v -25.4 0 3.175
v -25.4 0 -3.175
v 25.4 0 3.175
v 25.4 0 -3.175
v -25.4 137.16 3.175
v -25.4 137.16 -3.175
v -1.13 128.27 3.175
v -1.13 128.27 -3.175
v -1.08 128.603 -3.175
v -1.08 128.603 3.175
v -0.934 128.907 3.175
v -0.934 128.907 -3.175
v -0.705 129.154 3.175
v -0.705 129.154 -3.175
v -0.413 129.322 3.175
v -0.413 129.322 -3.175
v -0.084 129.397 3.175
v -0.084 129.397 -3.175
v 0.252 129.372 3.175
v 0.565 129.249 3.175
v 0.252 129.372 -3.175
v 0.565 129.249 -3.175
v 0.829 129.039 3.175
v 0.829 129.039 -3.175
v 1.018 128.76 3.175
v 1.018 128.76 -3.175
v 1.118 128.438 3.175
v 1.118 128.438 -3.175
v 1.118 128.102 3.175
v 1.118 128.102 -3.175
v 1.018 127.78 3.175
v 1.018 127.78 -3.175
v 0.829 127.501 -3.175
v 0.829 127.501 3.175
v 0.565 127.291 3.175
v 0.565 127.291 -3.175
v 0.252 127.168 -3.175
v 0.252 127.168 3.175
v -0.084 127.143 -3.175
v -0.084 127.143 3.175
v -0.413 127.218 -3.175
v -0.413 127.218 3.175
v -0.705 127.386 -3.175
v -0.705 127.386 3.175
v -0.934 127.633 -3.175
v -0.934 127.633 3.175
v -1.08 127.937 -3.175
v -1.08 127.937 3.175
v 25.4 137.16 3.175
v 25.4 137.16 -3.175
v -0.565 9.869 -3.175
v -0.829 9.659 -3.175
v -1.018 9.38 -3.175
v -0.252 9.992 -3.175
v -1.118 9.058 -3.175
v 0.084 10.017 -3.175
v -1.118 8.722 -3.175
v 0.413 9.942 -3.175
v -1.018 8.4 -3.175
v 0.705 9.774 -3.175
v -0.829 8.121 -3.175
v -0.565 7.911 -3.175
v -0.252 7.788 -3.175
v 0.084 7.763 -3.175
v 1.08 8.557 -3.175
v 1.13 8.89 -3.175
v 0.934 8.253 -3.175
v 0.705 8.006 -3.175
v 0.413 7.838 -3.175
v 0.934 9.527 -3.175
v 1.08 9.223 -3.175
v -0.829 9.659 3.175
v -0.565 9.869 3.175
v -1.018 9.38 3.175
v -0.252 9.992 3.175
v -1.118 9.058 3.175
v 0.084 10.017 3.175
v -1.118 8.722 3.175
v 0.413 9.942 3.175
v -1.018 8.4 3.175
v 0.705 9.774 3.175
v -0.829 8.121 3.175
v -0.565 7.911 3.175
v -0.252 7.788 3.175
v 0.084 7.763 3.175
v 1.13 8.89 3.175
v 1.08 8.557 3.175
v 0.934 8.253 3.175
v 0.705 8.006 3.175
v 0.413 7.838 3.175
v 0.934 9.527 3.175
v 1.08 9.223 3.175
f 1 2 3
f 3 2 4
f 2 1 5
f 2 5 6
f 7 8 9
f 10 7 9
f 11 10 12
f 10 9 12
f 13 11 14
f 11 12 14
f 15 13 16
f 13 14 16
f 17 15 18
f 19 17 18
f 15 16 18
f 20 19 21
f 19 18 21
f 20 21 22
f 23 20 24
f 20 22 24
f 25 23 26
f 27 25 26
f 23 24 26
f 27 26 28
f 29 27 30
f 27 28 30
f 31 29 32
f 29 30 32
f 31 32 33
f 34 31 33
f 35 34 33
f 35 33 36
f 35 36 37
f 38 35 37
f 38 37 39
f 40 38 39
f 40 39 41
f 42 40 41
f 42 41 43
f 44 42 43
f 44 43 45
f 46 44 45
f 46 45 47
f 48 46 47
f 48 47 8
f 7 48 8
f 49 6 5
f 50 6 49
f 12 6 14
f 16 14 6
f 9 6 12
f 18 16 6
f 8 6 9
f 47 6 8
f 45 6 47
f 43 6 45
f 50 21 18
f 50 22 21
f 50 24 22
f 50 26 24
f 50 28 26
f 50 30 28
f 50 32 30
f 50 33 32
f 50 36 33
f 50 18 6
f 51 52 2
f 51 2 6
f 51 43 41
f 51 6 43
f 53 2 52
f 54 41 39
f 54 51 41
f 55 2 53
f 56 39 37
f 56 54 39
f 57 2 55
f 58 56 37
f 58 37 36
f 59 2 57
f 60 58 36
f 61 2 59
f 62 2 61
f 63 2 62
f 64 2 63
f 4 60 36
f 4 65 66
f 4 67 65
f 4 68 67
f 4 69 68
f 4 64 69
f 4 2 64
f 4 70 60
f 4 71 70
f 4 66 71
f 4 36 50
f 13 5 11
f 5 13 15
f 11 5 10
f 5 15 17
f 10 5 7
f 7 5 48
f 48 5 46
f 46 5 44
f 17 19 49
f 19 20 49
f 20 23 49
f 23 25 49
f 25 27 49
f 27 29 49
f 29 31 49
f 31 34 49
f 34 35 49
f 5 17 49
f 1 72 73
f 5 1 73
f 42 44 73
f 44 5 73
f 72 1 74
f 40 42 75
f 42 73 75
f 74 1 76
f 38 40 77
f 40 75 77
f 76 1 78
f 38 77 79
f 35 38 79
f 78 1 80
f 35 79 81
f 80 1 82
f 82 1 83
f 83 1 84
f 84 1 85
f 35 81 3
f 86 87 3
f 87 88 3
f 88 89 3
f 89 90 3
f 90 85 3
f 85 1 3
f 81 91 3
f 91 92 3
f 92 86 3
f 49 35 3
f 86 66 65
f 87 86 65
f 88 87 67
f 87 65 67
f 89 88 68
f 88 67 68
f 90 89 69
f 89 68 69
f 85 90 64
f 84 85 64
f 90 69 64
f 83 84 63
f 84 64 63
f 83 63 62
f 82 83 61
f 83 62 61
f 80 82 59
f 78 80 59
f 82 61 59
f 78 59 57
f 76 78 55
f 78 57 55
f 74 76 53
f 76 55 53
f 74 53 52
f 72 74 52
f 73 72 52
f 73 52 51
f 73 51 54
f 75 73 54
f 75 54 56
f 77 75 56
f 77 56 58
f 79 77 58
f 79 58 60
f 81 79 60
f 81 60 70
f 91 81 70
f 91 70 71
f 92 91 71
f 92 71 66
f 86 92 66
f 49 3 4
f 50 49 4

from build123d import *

# Parameters (mm, degrees)
SKETCH1_W           = 50.8
SKETCH1_H           = 6.35
BOSS_EXTRUDE1_DEPTH = 137.16
SKETCH2_R           = 1.1303
CUT_EXTRUDE1_DEPTH  = 140.636485562


with BuildPart() as part:
    # Sketch1 → Boss-Extrude1 (new body)
    with BuildSketch(Plane(origin=(0, 0, 0), x_dir=(1, 0, 0), z_dir=(0, 1, 0))):
        Rectangle(SKETCH1_W, SKETCH1_H)
    extrude(amount=BOSS_EXTRUDE1_DEPTH)

    # Sketch2 → Cut-Extrude1 (cut, through all)
    with BuildSketch(Plane(origin=(0, 0, -3.175), x_dir=(-1, 0, 0), z_dir=(0, 0, -1))):
        with Locations((0, 128.27)):
            Circle(SKETCH2_R)
        with Locations(Location((0, 8.89, 0), (0, 0, 180))):
            Circle(SKETCH2_R)
    extrude(amount=-CUT_EXTRUDE1_DEPTH, mode=Mode.SUBTRACT)


solid = part.part
